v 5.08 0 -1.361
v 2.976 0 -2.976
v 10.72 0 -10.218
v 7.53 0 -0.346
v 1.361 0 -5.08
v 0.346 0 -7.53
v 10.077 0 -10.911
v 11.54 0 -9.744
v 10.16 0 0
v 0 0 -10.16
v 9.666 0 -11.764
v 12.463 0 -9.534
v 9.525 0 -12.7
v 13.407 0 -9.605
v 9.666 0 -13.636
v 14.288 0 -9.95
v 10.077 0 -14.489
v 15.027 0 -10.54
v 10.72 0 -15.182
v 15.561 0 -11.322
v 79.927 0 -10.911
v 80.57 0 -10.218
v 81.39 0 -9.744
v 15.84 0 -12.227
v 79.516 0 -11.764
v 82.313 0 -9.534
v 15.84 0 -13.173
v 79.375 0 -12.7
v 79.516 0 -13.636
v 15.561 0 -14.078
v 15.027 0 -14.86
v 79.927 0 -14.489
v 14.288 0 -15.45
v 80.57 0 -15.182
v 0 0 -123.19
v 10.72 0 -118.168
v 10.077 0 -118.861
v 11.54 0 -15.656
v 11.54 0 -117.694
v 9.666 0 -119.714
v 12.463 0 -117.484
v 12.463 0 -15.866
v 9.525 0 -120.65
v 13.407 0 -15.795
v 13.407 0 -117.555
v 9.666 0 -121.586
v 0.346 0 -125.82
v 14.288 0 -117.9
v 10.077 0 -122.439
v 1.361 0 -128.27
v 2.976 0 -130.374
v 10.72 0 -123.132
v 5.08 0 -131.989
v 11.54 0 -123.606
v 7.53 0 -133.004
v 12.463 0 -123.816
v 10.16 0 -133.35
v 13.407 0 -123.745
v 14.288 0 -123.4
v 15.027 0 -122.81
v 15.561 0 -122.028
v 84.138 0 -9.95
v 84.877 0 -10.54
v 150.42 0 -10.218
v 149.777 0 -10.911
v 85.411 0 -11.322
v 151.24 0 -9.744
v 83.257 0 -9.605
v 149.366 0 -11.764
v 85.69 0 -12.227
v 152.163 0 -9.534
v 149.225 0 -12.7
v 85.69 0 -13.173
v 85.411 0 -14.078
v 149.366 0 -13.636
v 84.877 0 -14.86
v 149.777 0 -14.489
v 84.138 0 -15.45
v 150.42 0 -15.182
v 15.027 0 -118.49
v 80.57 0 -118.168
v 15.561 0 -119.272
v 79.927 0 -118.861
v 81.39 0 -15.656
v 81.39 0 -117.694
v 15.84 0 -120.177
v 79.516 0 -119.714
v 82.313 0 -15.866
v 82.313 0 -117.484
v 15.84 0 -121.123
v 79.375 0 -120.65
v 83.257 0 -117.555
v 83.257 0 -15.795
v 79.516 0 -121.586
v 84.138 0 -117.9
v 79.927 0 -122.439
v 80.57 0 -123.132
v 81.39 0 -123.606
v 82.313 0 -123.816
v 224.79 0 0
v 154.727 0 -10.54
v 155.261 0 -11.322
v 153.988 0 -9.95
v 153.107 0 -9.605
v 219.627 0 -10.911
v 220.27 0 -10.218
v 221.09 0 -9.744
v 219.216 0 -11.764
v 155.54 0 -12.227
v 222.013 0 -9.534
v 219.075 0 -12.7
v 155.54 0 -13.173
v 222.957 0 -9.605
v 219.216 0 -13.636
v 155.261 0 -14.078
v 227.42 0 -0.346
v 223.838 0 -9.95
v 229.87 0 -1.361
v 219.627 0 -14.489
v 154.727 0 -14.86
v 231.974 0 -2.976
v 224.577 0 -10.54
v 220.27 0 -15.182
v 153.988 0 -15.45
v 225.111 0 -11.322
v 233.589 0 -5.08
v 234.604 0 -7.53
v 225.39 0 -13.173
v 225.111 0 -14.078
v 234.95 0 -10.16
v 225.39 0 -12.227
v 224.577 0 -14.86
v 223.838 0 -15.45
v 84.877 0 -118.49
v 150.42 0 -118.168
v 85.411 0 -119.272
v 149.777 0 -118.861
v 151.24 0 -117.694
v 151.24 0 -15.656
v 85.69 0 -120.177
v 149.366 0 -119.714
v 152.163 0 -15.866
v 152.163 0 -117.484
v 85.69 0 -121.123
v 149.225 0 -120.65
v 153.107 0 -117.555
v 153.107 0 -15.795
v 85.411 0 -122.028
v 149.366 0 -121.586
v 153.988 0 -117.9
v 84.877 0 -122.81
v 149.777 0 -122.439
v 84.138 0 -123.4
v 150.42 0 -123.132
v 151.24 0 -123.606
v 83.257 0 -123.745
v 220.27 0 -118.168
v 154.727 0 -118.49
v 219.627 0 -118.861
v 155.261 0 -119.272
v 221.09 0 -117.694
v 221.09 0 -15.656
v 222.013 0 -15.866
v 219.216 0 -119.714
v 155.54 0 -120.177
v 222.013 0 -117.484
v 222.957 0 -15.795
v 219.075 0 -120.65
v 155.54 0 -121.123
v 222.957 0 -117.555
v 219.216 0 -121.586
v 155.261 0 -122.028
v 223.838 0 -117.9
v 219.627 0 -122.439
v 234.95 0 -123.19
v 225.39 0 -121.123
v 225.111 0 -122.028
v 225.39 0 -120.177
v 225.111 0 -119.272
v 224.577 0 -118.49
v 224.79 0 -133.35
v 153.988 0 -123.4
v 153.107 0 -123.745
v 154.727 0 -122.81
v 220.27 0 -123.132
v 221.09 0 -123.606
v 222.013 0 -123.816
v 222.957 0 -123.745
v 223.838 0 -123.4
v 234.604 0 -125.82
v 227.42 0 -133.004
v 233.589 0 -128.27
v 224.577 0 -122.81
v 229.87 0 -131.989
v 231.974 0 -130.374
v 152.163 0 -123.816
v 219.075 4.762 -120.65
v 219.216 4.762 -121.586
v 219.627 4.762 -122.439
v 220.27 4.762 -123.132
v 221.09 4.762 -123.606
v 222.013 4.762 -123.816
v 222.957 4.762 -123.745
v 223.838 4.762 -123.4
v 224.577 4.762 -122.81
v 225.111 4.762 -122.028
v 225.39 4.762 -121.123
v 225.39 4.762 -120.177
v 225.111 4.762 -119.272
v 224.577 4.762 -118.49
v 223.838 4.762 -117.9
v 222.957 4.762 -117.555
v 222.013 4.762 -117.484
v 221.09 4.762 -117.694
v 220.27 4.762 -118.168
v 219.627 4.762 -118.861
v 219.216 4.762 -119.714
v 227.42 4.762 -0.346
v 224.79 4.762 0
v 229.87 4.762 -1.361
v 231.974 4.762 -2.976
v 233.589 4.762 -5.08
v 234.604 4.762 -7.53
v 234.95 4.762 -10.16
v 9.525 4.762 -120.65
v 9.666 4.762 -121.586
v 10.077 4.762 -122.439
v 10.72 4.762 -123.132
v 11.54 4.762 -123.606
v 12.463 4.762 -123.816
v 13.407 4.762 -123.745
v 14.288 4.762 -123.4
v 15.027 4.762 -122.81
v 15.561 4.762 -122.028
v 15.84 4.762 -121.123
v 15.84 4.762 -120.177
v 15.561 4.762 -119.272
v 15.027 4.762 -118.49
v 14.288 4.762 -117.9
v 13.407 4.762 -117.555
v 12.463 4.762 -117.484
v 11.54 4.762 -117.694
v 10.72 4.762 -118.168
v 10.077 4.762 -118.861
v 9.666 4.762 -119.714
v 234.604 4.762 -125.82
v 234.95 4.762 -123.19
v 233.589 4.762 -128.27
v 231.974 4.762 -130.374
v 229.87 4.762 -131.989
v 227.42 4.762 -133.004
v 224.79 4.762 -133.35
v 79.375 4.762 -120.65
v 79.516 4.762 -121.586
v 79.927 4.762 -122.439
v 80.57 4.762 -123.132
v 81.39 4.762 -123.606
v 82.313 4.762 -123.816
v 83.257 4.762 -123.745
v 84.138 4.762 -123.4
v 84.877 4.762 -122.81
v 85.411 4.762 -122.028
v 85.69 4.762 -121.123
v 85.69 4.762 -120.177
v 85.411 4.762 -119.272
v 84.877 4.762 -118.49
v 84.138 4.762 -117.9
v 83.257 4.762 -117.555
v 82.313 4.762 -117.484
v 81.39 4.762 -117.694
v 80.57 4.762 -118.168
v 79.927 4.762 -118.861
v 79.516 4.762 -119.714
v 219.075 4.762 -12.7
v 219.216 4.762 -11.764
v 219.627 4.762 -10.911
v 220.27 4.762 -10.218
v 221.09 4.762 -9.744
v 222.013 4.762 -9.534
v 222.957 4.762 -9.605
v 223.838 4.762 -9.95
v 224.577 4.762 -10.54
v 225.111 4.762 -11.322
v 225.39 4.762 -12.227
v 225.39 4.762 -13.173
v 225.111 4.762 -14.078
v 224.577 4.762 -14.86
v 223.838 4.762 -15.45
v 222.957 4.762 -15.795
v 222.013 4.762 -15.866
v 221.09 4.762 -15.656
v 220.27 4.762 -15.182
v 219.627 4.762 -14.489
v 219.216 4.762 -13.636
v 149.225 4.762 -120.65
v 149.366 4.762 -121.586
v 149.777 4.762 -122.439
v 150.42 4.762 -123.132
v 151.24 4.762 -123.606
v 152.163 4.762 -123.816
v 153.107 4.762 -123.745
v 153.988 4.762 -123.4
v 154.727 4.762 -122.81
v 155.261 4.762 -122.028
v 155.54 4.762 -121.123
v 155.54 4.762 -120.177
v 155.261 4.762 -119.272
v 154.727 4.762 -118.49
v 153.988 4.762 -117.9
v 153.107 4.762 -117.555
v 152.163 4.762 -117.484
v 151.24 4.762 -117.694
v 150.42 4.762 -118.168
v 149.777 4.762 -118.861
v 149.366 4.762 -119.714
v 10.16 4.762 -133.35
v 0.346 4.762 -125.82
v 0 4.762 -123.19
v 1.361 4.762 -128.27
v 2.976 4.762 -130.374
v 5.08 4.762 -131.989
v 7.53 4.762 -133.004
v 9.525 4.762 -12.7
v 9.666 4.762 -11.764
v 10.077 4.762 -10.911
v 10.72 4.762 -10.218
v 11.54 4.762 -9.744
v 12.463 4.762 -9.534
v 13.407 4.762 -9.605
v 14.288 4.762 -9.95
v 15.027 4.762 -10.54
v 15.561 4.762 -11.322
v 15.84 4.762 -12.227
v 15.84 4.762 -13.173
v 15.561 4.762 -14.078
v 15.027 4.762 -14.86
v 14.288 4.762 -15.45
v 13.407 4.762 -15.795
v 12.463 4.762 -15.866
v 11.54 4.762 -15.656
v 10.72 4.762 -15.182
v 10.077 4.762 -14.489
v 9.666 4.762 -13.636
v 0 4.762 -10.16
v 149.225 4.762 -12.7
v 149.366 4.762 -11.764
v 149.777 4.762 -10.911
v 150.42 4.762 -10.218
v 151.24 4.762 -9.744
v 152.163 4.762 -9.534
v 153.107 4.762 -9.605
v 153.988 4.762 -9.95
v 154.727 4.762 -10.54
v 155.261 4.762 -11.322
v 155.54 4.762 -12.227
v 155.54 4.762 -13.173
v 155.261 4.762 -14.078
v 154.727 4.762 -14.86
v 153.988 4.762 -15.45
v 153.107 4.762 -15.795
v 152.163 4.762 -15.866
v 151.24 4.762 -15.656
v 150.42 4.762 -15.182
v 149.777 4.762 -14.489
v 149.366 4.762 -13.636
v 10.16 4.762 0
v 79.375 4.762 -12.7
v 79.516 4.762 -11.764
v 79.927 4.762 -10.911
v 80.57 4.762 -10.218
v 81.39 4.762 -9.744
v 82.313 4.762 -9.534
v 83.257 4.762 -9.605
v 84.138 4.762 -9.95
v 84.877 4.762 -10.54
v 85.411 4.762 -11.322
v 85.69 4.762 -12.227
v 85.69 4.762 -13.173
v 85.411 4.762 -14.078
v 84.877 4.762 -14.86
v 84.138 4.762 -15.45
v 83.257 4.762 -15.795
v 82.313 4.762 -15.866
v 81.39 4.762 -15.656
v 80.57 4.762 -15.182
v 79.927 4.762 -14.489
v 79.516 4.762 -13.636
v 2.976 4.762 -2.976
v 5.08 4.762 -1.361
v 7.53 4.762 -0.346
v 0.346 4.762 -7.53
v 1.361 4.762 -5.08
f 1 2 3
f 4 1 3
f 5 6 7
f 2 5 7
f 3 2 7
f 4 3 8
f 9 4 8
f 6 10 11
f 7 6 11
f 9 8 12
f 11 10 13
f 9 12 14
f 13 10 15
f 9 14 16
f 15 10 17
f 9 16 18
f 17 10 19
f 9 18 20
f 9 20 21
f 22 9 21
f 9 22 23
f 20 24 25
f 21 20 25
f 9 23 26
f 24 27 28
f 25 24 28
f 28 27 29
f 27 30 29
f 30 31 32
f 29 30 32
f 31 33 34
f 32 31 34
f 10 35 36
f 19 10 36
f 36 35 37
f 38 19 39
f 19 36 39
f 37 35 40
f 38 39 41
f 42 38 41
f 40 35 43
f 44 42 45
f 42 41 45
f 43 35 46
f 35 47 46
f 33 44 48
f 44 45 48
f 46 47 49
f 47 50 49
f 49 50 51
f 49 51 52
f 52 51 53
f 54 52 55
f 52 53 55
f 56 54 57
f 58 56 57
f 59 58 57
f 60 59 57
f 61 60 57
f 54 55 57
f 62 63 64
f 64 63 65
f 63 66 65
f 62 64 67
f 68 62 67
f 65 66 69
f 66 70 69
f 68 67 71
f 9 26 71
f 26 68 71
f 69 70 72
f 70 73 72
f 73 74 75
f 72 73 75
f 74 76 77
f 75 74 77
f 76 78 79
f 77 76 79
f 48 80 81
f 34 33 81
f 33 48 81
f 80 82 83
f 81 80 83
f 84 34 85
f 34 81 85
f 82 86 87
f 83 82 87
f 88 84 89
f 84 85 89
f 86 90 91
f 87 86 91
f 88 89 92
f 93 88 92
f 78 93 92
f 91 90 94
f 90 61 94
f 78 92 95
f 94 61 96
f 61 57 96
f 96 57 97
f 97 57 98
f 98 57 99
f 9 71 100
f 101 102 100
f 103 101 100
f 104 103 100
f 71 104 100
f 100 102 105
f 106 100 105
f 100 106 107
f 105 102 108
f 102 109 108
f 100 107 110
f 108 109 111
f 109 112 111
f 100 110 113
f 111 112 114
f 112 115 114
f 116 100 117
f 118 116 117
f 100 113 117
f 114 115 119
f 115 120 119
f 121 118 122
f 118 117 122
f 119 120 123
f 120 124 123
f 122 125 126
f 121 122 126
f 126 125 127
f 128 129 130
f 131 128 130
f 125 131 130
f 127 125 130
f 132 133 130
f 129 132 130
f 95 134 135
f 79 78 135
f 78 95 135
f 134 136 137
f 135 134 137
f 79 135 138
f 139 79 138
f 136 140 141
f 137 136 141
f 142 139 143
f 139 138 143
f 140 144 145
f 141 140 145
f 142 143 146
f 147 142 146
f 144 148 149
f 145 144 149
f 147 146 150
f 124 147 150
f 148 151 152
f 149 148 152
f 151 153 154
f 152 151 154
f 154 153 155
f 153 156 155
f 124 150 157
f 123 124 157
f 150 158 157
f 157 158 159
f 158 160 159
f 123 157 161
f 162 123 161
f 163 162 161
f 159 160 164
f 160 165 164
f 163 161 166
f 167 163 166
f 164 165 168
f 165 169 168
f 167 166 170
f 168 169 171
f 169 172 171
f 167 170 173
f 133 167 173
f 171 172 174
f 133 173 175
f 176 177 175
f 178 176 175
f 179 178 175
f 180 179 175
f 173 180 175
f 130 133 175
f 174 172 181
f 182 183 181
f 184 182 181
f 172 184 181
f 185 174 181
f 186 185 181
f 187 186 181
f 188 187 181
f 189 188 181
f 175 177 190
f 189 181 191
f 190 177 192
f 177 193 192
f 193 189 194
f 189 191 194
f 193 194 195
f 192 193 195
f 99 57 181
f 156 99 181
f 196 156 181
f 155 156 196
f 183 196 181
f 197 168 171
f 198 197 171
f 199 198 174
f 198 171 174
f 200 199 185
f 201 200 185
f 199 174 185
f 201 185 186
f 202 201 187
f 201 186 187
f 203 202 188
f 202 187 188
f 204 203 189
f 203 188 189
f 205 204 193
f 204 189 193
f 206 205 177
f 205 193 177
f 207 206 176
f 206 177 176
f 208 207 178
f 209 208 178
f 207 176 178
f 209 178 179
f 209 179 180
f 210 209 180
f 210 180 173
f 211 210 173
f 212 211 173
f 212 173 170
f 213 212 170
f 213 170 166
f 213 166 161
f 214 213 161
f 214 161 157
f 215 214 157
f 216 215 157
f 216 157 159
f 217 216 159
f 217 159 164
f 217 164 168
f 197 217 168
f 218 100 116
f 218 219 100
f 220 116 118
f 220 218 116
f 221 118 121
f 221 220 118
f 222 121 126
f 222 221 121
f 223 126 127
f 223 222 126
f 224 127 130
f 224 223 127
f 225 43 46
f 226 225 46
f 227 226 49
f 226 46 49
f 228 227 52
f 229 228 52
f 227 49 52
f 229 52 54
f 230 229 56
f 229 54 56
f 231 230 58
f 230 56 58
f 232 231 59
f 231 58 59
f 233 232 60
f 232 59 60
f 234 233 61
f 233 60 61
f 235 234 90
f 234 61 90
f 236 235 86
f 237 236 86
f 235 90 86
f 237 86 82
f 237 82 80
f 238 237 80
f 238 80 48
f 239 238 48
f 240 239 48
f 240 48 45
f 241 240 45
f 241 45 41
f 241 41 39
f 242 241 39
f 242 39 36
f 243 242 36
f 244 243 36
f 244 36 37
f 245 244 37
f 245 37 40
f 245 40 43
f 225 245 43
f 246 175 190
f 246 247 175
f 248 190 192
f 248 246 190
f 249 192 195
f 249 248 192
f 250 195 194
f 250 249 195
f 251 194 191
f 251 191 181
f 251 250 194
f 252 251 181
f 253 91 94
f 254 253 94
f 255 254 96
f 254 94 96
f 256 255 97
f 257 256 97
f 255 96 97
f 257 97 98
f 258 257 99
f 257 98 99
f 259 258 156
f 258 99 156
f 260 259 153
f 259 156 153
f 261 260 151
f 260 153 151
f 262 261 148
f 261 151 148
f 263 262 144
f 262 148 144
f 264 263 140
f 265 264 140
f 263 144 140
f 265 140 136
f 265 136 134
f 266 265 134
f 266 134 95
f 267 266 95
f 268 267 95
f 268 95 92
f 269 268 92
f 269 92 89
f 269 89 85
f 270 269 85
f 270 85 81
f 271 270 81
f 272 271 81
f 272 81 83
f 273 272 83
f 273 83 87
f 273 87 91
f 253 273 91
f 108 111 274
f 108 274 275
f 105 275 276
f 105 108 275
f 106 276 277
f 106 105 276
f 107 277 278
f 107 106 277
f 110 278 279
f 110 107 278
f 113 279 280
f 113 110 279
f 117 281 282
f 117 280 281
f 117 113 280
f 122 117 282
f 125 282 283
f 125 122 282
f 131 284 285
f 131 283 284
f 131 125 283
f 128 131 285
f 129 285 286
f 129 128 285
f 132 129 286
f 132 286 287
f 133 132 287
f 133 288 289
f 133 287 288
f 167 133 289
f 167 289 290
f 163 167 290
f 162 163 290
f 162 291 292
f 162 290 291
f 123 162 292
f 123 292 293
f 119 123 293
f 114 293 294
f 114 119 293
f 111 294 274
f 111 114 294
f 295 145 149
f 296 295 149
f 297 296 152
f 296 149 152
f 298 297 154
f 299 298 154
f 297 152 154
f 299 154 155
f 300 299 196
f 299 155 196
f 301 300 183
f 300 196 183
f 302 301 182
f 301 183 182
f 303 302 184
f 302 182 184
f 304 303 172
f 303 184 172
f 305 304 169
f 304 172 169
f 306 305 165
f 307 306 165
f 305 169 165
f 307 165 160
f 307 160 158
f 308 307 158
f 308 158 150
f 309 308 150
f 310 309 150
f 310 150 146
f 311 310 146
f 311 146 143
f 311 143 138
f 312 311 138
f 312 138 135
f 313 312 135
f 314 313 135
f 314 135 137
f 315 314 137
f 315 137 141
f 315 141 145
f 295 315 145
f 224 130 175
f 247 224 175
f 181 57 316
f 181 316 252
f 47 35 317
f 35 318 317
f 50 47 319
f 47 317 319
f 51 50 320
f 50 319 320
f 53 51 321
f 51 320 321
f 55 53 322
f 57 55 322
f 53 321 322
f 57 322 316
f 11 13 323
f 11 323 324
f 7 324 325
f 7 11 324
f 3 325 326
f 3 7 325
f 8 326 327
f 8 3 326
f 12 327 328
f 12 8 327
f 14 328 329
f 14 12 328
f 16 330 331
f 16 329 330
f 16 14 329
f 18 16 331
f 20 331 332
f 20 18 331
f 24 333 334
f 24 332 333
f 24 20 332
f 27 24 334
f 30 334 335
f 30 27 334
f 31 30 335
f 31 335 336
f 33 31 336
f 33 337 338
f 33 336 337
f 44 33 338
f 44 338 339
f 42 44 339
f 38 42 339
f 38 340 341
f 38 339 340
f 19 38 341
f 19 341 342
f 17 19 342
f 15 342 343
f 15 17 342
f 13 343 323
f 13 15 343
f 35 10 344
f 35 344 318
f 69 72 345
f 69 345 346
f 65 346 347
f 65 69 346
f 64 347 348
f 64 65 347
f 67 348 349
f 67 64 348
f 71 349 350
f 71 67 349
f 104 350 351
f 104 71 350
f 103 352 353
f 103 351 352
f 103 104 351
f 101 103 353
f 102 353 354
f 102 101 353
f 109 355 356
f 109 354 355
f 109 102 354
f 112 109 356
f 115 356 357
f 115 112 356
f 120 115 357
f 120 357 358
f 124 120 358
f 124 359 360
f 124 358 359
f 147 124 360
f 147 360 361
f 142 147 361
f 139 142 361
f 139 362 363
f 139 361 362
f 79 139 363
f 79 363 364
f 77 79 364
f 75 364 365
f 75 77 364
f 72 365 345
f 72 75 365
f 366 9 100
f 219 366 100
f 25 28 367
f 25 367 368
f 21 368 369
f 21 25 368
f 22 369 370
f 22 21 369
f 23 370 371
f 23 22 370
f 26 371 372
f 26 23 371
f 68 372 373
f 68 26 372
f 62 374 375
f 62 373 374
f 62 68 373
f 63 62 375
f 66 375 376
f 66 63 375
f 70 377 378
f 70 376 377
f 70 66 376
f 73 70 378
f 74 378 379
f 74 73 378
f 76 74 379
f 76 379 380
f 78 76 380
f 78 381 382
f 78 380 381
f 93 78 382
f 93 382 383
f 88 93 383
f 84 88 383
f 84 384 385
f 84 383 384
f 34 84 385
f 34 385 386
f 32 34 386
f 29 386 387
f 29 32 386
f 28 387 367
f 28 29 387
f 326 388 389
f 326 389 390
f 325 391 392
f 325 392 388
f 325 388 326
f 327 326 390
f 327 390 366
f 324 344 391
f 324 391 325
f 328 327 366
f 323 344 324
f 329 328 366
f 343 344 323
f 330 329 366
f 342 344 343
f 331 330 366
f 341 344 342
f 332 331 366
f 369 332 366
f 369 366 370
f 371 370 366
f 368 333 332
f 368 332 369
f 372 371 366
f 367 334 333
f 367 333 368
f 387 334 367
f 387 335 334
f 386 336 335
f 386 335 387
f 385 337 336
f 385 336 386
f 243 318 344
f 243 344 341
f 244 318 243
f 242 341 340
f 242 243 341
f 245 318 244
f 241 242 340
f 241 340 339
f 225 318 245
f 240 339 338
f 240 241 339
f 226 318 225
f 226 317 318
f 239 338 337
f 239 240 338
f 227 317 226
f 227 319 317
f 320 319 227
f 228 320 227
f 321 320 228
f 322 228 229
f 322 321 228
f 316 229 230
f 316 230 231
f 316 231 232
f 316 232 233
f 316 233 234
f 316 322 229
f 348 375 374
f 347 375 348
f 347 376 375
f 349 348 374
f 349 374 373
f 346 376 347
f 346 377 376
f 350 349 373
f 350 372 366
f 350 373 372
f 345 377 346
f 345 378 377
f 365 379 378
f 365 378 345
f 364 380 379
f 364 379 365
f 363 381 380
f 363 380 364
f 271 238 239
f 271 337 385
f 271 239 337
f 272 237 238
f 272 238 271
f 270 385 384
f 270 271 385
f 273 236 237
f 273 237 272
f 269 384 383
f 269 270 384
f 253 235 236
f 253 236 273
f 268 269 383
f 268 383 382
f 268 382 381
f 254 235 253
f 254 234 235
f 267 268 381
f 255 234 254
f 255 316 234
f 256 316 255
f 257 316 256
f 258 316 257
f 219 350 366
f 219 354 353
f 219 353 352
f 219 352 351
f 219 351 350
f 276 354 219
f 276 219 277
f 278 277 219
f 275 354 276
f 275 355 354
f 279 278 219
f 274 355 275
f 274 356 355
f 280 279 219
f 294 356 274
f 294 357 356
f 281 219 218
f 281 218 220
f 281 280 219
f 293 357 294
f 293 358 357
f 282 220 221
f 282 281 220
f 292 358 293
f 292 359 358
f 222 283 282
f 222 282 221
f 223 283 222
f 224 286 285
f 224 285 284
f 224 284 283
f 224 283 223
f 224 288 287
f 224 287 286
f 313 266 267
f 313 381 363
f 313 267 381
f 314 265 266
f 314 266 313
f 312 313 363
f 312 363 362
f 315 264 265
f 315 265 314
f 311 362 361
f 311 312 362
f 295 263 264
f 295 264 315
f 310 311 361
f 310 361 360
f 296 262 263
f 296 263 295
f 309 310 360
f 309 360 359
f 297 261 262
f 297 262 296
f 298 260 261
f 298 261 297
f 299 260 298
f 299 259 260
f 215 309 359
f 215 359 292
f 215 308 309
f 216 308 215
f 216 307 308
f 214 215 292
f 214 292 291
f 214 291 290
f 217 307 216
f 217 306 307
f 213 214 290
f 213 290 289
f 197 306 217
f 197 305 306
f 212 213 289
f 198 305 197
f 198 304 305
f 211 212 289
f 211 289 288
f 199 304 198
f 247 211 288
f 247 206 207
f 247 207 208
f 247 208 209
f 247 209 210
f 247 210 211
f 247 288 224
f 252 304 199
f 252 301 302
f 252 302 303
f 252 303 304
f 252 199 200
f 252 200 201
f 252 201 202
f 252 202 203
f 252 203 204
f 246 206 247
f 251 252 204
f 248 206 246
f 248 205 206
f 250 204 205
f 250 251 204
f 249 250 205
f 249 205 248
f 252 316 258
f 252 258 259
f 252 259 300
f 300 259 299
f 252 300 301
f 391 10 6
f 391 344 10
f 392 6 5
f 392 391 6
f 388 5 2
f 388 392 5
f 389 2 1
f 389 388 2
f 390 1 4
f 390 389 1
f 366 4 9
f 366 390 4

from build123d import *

# Parameters (mm, degrees)
SKETCH1_W                   = 234.95
SKETCH1_H                   = 133.35
BOSS_EXTRUDE1_DEPTH         = 4.7625
FILLET1_R                   = 10.16
F_1_4_0_25_DIAMETER_HOLE3_D = 6.35


with BuildPart() as part:
    # Sketch1 → Boss-Extrude1 (new body)
    with BuildSketch(Plane(origin=(0, 0, 0), x_dir=(1, 0, 0), z_dir=(0, 1, 0))):
        with Locations((117.475, 66.675)):
            Rectangle(SKETCH1_W, SKETCH1_H)
    extrude(amount=BOSS_EXTRUDE1_DEPTH)

    # Fillet1
    fillet1_edges = [part.edges().sort_by_distance(p)[0] for p in [
        (0, 2.38125, -133.35),
        (234.95, 2.38125, -133.35),
        (234.95, 2.38125, 0),
        (0, 2.38125, 0),
    ]]
    fillet(fillet1_edges, radius=FILLET1_R)

    # 1/4 (0.25) Diameter Hole3 (through all)
    with Locations(Plane(origin=(0, 4.7625, 0), x_dir=(1, 0, 0), z_dir=(0, 1, 0))):
        with Locations((12.7, 120.65), (82.55, 120.65), (152.4, 120.65), (222.25, 120.65)):
            f_1_4_0_25_diameter_hole3 = Hole(F_1_4_0_25_DIAMETER_HOLE3_D / 2)

    # Mirror1: 1/4 (0.25) Diameter Hole3 across plane
    add(f_1_4_0_25_diameter_hole3.mirror(Plane.XY.offset(-66.675)), mode=Mode.SUBTRACT)


solid = part.part
